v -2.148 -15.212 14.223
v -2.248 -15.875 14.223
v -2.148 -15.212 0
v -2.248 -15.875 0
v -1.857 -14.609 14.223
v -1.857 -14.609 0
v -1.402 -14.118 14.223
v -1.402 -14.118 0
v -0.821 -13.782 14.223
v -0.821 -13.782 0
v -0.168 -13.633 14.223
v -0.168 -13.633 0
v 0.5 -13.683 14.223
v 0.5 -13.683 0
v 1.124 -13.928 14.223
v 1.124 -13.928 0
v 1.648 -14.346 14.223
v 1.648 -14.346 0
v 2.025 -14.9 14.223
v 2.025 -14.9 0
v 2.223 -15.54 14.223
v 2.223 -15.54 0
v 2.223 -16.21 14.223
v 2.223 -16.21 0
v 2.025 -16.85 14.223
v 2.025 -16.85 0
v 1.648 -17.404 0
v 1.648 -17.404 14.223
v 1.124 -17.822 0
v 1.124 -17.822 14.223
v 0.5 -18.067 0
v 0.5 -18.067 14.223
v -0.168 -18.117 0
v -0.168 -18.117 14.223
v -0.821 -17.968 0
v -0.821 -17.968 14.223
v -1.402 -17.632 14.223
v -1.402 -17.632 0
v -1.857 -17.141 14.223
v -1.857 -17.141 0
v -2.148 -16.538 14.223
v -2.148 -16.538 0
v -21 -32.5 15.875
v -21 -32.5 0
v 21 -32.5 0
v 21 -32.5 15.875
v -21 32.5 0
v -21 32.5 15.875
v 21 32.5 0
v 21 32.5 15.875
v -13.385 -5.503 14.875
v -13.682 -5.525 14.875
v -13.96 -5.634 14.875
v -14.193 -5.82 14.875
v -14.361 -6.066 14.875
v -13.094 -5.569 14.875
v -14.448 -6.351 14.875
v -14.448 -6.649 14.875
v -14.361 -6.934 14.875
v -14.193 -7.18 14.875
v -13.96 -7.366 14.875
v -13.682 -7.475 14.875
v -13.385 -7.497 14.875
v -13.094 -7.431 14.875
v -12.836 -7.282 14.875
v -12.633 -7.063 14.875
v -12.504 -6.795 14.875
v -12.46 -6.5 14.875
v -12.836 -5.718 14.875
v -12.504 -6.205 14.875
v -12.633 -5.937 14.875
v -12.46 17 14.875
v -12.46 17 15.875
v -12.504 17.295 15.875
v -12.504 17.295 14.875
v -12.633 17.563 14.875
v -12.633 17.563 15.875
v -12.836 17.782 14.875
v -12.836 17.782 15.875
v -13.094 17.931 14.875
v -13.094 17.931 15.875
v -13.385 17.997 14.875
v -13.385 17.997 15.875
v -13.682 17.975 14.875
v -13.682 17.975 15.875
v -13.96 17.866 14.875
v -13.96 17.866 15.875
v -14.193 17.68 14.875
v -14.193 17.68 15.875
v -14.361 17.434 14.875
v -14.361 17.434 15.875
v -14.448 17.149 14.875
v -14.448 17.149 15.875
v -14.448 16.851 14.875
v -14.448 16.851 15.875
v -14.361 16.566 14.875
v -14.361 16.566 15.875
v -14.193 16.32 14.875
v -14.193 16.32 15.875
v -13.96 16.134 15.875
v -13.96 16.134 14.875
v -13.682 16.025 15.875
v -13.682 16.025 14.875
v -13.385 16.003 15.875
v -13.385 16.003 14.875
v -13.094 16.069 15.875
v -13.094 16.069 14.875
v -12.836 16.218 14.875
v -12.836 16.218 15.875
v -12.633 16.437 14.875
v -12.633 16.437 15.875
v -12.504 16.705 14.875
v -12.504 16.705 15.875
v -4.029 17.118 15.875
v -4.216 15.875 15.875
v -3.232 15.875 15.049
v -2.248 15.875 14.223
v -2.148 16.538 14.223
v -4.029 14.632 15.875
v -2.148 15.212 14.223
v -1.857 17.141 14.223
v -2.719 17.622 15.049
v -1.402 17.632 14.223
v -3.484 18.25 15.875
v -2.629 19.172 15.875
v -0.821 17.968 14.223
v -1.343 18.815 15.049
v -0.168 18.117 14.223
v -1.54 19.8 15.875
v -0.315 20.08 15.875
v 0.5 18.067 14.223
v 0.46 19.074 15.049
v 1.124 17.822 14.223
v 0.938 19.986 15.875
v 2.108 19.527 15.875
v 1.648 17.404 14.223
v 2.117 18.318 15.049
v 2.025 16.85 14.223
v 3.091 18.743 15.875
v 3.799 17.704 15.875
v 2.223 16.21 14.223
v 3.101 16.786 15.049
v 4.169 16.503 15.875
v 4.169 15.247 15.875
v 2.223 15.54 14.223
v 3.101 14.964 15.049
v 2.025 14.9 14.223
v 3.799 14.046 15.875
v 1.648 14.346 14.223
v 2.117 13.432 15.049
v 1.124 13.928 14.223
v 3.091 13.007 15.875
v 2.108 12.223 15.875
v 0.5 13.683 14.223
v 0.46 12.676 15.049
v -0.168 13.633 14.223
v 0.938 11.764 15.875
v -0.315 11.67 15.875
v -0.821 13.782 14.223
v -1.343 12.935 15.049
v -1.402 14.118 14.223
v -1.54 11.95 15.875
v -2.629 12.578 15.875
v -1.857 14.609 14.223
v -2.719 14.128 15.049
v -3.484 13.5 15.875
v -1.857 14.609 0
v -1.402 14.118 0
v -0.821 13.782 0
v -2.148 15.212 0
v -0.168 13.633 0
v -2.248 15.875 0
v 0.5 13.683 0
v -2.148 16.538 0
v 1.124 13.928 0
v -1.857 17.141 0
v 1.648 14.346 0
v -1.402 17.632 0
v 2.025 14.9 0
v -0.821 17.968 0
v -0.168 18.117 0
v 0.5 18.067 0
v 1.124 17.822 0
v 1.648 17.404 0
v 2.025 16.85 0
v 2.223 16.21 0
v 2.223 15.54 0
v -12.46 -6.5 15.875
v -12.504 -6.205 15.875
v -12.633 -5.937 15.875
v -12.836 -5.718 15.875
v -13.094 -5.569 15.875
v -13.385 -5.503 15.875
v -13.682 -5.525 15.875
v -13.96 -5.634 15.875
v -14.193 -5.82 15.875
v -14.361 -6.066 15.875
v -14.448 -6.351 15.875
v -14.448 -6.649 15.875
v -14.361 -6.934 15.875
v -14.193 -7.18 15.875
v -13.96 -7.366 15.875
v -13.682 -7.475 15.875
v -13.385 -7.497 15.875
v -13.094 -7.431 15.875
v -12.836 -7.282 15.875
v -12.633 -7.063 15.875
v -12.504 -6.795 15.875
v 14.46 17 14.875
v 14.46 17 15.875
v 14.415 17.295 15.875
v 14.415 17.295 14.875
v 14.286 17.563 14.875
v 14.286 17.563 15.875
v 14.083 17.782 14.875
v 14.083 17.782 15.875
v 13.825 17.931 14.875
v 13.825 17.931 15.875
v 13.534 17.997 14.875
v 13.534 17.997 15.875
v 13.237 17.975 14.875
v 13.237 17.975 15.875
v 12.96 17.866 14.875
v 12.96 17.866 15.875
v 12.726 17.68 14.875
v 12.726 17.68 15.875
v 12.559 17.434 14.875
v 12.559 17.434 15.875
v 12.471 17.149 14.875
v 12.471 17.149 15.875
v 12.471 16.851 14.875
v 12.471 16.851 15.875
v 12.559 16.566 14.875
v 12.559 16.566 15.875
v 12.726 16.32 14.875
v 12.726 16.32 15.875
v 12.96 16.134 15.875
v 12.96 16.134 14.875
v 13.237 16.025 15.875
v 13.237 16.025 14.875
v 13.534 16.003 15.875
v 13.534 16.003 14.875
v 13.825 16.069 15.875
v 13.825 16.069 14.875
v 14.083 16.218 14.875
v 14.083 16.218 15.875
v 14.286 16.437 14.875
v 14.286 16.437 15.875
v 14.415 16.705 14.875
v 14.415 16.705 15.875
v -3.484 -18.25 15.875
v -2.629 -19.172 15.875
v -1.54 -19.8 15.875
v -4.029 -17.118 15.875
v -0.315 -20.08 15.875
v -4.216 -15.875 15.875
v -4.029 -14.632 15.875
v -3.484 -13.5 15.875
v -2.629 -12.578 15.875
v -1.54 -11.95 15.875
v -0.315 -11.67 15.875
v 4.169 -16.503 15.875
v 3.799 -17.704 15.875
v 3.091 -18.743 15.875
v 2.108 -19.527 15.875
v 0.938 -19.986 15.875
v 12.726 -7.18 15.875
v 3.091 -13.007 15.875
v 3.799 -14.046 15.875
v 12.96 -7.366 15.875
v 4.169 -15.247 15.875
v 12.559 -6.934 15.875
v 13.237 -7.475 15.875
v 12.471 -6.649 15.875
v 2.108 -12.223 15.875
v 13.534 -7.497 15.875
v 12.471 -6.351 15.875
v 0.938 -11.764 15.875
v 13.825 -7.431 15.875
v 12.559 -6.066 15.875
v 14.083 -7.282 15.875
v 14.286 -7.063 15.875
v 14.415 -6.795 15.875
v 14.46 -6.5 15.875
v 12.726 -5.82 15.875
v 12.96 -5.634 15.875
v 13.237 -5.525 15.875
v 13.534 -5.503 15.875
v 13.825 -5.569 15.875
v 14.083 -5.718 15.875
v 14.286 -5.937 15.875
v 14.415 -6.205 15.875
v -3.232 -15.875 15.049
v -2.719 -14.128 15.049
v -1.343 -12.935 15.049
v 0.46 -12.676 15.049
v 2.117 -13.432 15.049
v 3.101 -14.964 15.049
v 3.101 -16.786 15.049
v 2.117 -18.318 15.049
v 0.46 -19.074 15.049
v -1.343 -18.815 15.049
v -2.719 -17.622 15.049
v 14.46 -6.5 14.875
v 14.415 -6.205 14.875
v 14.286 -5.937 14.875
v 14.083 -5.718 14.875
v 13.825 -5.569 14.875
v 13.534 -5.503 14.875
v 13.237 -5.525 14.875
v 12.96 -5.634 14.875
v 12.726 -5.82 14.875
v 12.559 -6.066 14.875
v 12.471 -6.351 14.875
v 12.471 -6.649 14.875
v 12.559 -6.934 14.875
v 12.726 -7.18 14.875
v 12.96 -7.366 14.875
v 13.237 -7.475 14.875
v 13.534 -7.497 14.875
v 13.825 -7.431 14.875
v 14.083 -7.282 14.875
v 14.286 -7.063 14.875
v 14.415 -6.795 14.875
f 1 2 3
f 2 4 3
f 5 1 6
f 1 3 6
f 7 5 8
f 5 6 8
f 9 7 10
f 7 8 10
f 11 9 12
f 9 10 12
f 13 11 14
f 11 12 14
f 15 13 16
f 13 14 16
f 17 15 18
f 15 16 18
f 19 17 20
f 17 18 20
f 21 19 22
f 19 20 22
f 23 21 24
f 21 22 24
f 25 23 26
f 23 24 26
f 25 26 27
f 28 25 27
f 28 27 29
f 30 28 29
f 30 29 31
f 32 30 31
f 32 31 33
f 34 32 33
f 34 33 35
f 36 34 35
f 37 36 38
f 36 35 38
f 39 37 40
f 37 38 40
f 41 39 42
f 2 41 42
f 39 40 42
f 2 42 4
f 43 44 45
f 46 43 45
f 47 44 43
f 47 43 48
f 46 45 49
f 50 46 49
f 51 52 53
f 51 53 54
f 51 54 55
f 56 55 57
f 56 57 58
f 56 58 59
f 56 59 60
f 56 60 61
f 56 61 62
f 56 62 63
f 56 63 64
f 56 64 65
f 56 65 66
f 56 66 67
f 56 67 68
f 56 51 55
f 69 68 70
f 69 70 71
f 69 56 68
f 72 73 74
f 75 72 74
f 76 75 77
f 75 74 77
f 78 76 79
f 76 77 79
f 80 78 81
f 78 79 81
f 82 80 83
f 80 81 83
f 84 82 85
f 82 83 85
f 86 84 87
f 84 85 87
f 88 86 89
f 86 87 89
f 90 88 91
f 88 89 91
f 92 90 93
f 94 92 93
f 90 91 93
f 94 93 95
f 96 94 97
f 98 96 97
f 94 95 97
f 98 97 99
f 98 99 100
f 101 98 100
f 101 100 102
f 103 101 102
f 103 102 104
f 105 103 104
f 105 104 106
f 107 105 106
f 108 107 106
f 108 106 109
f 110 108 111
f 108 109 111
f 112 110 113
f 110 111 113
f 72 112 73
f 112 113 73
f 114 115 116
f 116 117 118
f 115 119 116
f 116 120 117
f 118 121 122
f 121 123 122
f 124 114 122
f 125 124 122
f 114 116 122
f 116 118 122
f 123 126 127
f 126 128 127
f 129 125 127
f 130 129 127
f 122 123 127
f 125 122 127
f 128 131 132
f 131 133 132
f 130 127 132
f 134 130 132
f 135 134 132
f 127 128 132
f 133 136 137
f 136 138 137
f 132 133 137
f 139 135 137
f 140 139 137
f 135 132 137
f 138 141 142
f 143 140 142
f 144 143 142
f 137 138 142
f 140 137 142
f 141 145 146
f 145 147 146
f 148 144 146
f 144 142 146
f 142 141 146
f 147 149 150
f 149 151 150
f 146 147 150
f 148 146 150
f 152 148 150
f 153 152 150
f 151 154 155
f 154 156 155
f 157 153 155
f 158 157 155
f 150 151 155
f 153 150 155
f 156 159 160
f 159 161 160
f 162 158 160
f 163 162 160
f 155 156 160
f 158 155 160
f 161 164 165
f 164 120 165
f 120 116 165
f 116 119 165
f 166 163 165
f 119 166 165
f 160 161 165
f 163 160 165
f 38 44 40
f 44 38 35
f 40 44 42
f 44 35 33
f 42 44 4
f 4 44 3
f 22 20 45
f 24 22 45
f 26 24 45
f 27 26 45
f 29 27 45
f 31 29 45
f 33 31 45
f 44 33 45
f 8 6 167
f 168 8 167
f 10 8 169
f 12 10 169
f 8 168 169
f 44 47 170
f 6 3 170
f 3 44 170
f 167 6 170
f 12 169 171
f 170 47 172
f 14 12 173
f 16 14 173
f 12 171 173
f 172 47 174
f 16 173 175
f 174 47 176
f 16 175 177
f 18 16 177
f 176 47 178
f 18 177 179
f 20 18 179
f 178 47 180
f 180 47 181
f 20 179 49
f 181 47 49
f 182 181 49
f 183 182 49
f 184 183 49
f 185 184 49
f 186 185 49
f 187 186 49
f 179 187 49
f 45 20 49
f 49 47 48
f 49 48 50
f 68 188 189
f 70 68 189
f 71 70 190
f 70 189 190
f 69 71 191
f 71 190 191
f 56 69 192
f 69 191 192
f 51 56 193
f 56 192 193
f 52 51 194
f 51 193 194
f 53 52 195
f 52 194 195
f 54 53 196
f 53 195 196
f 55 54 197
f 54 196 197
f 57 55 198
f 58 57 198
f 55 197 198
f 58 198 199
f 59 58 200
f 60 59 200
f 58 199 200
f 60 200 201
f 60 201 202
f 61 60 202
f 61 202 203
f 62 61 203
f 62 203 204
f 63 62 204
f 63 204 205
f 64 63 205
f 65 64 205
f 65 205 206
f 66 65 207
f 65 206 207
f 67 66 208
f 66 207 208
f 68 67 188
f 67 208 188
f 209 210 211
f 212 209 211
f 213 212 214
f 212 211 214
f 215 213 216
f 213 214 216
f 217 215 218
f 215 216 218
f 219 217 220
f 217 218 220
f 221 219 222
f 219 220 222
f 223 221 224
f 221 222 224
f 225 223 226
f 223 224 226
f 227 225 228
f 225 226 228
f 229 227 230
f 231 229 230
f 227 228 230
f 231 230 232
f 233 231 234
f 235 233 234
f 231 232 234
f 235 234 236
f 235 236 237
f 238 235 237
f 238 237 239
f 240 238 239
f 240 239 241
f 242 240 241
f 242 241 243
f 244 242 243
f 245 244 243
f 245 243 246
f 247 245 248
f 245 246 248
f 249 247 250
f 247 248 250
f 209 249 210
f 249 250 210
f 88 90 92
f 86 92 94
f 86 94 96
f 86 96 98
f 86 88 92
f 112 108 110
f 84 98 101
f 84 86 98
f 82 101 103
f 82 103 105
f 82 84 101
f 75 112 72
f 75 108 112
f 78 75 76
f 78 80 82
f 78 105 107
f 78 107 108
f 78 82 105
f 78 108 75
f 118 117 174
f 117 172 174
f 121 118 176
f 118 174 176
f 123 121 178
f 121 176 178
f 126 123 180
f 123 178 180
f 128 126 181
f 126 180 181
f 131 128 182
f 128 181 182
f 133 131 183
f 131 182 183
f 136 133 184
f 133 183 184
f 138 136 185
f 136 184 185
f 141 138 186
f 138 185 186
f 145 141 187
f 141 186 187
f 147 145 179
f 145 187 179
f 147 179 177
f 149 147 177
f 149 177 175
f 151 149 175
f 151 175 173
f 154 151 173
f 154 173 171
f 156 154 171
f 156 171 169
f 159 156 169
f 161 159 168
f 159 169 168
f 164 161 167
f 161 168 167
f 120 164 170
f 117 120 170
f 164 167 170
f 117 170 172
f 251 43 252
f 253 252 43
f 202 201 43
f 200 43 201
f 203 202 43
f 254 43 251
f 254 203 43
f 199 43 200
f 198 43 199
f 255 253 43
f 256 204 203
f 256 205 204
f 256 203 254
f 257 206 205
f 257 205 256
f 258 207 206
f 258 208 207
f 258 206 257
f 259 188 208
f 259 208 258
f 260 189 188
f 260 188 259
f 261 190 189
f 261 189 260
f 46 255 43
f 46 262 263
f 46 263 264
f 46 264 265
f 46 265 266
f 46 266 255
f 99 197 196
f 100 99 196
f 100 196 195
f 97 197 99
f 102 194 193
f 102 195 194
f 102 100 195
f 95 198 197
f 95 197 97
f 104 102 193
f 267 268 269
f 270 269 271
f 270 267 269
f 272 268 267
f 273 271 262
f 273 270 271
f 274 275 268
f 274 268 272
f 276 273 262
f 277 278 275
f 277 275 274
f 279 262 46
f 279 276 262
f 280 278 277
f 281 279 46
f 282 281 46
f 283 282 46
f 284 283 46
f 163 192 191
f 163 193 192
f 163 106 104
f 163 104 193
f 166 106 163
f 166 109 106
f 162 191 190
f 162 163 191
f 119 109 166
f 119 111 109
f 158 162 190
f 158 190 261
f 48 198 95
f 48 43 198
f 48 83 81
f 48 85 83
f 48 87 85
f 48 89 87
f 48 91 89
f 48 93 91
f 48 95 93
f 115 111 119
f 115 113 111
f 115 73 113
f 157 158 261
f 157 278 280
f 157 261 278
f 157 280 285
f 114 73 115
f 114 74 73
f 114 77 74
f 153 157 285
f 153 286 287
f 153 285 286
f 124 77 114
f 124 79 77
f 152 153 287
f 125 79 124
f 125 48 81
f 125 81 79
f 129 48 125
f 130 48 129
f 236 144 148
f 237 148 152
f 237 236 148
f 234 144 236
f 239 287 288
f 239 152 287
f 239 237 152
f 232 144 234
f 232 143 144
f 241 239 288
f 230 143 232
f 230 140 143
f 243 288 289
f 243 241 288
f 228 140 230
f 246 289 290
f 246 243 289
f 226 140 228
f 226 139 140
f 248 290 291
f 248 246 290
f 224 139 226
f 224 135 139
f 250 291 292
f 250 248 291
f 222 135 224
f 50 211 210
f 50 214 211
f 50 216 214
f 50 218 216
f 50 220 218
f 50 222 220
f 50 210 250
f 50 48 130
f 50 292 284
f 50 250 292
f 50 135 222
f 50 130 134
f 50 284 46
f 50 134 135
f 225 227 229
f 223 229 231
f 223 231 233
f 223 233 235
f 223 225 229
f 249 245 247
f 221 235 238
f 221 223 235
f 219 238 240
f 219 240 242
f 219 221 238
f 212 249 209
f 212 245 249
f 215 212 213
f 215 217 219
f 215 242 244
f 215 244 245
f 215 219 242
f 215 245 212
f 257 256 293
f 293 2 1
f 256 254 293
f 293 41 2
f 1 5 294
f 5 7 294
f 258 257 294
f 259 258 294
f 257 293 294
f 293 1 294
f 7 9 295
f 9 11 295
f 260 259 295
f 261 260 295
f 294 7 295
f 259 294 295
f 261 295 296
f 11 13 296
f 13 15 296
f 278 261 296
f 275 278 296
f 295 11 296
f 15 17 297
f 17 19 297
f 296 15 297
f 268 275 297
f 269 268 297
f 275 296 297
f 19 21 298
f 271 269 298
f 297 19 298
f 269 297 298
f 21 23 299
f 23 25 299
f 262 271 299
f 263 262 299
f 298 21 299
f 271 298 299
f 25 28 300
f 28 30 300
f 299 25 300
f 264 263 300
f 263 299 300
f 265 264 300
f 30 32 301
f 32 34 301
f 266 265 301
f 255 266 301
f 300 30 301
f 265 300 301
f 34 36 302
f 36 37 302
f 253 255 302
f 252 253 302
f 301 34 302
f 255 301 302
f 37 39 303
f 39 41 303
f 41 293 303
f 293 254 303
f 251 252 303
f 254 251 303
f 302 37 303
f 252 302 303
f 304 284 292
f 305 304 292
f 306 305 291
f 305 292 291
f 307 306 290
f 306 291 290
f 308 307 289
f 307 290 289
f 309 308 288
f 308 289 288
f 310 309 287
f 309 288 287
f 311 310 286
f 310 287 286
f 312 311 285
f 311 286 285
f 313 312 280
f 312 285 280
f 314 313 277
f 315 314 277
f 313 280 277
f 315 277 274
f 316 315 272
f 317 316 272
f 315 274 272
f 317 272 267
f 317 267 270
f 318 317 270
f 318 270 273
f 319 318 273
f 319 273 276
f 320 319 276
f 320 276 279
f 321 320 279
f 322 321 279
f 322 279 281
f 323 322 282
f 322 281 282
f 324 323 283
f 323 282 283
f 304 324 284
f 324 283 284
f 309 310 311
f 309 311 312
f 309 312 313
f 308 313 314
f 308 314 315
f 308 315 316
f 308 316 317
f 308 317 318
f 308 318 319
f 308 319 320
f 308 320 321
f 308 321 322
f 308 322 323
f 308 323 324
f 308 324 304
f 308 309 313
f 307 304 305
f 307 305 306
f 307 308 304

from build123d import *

# Parameters (mm, degrees)
SKETCH1_W                                         = 42
SKETCH1_H                                         = 65
BOSS_EXTRUDE1_DEPTH                               = 15.875
SKETCH2_R                                         = 1
CUT_EXTRUDE1_DEPTH                                = 1
CUT_EXTRUDE1_DEPTH_BACK                           = 1
CSK_FOR_8_FLAT_HEAD_MACHINE_SCREW_100_D           = 4.4958
CSK_FOR_8_FLAT_HEAD_MACHINE_SCREW_100_CSINK_D     = 8.4328
CSK_FOR_8_FLAT_HEAD_MACHINE_SCREW_100_CSINK_ANGLE = 100


with BuildPart() as part:
    # Sketch1 → Boss-Extrude1 (new body)
    with BuildSketch(Plane.XY):
        Rectangle(SKETCH1_W, SKETCH1_H)
    extrude(amount=BOSS_EXTRUDE1_DEPTH)

    # Sketch2 → Cut-Extrude1 (cut, two sides)
    with BuildSketch(Plane.XY.offset(15.875)) as cut_extrude1_sk:
        with Locations((-13.459539776, -6.5)):
            Circle(SKETCH2_R)
        with Locations((-13.459539776, 17)):
            Circle(SKETCH2_R)
        with Locations((13.459539776, 17)):
            Circle(SKETCH2_R)
        with Locations((13.459539776, -6.5)):
            Circle(SKETCH2_R)
    extrude(amount=CUT_EXTRUDE1_DEPTH, mode=Mode.SUBTRACT)
    extrude(cut_extrude1_sk.sketch, amount=-CUT_EXTRUDE1_DEPTH_BACK, mode=Mode.SUBTRACT)

    # CSK for #8 Flat Head Machine Screw (100)1 (through all)
    with Locations(Plane.XY.offset(15.875)):
        with Locations((0, 15.875), (0, -15.875)):
            CounterSinkHole(CSK_FOR_8_FLAT_HEAD_MACHINE_SCREW_100_D / 2, CSK_FOR_8_FLAT_HEAD_MACHINE_SCREW_100_CSINK_D / 2, counter_sink_angle=CSK_FOR_8_FLAT_HEAD_MACHINE_SCREW_100_CSINK_ANGLE)


solid = part.part
